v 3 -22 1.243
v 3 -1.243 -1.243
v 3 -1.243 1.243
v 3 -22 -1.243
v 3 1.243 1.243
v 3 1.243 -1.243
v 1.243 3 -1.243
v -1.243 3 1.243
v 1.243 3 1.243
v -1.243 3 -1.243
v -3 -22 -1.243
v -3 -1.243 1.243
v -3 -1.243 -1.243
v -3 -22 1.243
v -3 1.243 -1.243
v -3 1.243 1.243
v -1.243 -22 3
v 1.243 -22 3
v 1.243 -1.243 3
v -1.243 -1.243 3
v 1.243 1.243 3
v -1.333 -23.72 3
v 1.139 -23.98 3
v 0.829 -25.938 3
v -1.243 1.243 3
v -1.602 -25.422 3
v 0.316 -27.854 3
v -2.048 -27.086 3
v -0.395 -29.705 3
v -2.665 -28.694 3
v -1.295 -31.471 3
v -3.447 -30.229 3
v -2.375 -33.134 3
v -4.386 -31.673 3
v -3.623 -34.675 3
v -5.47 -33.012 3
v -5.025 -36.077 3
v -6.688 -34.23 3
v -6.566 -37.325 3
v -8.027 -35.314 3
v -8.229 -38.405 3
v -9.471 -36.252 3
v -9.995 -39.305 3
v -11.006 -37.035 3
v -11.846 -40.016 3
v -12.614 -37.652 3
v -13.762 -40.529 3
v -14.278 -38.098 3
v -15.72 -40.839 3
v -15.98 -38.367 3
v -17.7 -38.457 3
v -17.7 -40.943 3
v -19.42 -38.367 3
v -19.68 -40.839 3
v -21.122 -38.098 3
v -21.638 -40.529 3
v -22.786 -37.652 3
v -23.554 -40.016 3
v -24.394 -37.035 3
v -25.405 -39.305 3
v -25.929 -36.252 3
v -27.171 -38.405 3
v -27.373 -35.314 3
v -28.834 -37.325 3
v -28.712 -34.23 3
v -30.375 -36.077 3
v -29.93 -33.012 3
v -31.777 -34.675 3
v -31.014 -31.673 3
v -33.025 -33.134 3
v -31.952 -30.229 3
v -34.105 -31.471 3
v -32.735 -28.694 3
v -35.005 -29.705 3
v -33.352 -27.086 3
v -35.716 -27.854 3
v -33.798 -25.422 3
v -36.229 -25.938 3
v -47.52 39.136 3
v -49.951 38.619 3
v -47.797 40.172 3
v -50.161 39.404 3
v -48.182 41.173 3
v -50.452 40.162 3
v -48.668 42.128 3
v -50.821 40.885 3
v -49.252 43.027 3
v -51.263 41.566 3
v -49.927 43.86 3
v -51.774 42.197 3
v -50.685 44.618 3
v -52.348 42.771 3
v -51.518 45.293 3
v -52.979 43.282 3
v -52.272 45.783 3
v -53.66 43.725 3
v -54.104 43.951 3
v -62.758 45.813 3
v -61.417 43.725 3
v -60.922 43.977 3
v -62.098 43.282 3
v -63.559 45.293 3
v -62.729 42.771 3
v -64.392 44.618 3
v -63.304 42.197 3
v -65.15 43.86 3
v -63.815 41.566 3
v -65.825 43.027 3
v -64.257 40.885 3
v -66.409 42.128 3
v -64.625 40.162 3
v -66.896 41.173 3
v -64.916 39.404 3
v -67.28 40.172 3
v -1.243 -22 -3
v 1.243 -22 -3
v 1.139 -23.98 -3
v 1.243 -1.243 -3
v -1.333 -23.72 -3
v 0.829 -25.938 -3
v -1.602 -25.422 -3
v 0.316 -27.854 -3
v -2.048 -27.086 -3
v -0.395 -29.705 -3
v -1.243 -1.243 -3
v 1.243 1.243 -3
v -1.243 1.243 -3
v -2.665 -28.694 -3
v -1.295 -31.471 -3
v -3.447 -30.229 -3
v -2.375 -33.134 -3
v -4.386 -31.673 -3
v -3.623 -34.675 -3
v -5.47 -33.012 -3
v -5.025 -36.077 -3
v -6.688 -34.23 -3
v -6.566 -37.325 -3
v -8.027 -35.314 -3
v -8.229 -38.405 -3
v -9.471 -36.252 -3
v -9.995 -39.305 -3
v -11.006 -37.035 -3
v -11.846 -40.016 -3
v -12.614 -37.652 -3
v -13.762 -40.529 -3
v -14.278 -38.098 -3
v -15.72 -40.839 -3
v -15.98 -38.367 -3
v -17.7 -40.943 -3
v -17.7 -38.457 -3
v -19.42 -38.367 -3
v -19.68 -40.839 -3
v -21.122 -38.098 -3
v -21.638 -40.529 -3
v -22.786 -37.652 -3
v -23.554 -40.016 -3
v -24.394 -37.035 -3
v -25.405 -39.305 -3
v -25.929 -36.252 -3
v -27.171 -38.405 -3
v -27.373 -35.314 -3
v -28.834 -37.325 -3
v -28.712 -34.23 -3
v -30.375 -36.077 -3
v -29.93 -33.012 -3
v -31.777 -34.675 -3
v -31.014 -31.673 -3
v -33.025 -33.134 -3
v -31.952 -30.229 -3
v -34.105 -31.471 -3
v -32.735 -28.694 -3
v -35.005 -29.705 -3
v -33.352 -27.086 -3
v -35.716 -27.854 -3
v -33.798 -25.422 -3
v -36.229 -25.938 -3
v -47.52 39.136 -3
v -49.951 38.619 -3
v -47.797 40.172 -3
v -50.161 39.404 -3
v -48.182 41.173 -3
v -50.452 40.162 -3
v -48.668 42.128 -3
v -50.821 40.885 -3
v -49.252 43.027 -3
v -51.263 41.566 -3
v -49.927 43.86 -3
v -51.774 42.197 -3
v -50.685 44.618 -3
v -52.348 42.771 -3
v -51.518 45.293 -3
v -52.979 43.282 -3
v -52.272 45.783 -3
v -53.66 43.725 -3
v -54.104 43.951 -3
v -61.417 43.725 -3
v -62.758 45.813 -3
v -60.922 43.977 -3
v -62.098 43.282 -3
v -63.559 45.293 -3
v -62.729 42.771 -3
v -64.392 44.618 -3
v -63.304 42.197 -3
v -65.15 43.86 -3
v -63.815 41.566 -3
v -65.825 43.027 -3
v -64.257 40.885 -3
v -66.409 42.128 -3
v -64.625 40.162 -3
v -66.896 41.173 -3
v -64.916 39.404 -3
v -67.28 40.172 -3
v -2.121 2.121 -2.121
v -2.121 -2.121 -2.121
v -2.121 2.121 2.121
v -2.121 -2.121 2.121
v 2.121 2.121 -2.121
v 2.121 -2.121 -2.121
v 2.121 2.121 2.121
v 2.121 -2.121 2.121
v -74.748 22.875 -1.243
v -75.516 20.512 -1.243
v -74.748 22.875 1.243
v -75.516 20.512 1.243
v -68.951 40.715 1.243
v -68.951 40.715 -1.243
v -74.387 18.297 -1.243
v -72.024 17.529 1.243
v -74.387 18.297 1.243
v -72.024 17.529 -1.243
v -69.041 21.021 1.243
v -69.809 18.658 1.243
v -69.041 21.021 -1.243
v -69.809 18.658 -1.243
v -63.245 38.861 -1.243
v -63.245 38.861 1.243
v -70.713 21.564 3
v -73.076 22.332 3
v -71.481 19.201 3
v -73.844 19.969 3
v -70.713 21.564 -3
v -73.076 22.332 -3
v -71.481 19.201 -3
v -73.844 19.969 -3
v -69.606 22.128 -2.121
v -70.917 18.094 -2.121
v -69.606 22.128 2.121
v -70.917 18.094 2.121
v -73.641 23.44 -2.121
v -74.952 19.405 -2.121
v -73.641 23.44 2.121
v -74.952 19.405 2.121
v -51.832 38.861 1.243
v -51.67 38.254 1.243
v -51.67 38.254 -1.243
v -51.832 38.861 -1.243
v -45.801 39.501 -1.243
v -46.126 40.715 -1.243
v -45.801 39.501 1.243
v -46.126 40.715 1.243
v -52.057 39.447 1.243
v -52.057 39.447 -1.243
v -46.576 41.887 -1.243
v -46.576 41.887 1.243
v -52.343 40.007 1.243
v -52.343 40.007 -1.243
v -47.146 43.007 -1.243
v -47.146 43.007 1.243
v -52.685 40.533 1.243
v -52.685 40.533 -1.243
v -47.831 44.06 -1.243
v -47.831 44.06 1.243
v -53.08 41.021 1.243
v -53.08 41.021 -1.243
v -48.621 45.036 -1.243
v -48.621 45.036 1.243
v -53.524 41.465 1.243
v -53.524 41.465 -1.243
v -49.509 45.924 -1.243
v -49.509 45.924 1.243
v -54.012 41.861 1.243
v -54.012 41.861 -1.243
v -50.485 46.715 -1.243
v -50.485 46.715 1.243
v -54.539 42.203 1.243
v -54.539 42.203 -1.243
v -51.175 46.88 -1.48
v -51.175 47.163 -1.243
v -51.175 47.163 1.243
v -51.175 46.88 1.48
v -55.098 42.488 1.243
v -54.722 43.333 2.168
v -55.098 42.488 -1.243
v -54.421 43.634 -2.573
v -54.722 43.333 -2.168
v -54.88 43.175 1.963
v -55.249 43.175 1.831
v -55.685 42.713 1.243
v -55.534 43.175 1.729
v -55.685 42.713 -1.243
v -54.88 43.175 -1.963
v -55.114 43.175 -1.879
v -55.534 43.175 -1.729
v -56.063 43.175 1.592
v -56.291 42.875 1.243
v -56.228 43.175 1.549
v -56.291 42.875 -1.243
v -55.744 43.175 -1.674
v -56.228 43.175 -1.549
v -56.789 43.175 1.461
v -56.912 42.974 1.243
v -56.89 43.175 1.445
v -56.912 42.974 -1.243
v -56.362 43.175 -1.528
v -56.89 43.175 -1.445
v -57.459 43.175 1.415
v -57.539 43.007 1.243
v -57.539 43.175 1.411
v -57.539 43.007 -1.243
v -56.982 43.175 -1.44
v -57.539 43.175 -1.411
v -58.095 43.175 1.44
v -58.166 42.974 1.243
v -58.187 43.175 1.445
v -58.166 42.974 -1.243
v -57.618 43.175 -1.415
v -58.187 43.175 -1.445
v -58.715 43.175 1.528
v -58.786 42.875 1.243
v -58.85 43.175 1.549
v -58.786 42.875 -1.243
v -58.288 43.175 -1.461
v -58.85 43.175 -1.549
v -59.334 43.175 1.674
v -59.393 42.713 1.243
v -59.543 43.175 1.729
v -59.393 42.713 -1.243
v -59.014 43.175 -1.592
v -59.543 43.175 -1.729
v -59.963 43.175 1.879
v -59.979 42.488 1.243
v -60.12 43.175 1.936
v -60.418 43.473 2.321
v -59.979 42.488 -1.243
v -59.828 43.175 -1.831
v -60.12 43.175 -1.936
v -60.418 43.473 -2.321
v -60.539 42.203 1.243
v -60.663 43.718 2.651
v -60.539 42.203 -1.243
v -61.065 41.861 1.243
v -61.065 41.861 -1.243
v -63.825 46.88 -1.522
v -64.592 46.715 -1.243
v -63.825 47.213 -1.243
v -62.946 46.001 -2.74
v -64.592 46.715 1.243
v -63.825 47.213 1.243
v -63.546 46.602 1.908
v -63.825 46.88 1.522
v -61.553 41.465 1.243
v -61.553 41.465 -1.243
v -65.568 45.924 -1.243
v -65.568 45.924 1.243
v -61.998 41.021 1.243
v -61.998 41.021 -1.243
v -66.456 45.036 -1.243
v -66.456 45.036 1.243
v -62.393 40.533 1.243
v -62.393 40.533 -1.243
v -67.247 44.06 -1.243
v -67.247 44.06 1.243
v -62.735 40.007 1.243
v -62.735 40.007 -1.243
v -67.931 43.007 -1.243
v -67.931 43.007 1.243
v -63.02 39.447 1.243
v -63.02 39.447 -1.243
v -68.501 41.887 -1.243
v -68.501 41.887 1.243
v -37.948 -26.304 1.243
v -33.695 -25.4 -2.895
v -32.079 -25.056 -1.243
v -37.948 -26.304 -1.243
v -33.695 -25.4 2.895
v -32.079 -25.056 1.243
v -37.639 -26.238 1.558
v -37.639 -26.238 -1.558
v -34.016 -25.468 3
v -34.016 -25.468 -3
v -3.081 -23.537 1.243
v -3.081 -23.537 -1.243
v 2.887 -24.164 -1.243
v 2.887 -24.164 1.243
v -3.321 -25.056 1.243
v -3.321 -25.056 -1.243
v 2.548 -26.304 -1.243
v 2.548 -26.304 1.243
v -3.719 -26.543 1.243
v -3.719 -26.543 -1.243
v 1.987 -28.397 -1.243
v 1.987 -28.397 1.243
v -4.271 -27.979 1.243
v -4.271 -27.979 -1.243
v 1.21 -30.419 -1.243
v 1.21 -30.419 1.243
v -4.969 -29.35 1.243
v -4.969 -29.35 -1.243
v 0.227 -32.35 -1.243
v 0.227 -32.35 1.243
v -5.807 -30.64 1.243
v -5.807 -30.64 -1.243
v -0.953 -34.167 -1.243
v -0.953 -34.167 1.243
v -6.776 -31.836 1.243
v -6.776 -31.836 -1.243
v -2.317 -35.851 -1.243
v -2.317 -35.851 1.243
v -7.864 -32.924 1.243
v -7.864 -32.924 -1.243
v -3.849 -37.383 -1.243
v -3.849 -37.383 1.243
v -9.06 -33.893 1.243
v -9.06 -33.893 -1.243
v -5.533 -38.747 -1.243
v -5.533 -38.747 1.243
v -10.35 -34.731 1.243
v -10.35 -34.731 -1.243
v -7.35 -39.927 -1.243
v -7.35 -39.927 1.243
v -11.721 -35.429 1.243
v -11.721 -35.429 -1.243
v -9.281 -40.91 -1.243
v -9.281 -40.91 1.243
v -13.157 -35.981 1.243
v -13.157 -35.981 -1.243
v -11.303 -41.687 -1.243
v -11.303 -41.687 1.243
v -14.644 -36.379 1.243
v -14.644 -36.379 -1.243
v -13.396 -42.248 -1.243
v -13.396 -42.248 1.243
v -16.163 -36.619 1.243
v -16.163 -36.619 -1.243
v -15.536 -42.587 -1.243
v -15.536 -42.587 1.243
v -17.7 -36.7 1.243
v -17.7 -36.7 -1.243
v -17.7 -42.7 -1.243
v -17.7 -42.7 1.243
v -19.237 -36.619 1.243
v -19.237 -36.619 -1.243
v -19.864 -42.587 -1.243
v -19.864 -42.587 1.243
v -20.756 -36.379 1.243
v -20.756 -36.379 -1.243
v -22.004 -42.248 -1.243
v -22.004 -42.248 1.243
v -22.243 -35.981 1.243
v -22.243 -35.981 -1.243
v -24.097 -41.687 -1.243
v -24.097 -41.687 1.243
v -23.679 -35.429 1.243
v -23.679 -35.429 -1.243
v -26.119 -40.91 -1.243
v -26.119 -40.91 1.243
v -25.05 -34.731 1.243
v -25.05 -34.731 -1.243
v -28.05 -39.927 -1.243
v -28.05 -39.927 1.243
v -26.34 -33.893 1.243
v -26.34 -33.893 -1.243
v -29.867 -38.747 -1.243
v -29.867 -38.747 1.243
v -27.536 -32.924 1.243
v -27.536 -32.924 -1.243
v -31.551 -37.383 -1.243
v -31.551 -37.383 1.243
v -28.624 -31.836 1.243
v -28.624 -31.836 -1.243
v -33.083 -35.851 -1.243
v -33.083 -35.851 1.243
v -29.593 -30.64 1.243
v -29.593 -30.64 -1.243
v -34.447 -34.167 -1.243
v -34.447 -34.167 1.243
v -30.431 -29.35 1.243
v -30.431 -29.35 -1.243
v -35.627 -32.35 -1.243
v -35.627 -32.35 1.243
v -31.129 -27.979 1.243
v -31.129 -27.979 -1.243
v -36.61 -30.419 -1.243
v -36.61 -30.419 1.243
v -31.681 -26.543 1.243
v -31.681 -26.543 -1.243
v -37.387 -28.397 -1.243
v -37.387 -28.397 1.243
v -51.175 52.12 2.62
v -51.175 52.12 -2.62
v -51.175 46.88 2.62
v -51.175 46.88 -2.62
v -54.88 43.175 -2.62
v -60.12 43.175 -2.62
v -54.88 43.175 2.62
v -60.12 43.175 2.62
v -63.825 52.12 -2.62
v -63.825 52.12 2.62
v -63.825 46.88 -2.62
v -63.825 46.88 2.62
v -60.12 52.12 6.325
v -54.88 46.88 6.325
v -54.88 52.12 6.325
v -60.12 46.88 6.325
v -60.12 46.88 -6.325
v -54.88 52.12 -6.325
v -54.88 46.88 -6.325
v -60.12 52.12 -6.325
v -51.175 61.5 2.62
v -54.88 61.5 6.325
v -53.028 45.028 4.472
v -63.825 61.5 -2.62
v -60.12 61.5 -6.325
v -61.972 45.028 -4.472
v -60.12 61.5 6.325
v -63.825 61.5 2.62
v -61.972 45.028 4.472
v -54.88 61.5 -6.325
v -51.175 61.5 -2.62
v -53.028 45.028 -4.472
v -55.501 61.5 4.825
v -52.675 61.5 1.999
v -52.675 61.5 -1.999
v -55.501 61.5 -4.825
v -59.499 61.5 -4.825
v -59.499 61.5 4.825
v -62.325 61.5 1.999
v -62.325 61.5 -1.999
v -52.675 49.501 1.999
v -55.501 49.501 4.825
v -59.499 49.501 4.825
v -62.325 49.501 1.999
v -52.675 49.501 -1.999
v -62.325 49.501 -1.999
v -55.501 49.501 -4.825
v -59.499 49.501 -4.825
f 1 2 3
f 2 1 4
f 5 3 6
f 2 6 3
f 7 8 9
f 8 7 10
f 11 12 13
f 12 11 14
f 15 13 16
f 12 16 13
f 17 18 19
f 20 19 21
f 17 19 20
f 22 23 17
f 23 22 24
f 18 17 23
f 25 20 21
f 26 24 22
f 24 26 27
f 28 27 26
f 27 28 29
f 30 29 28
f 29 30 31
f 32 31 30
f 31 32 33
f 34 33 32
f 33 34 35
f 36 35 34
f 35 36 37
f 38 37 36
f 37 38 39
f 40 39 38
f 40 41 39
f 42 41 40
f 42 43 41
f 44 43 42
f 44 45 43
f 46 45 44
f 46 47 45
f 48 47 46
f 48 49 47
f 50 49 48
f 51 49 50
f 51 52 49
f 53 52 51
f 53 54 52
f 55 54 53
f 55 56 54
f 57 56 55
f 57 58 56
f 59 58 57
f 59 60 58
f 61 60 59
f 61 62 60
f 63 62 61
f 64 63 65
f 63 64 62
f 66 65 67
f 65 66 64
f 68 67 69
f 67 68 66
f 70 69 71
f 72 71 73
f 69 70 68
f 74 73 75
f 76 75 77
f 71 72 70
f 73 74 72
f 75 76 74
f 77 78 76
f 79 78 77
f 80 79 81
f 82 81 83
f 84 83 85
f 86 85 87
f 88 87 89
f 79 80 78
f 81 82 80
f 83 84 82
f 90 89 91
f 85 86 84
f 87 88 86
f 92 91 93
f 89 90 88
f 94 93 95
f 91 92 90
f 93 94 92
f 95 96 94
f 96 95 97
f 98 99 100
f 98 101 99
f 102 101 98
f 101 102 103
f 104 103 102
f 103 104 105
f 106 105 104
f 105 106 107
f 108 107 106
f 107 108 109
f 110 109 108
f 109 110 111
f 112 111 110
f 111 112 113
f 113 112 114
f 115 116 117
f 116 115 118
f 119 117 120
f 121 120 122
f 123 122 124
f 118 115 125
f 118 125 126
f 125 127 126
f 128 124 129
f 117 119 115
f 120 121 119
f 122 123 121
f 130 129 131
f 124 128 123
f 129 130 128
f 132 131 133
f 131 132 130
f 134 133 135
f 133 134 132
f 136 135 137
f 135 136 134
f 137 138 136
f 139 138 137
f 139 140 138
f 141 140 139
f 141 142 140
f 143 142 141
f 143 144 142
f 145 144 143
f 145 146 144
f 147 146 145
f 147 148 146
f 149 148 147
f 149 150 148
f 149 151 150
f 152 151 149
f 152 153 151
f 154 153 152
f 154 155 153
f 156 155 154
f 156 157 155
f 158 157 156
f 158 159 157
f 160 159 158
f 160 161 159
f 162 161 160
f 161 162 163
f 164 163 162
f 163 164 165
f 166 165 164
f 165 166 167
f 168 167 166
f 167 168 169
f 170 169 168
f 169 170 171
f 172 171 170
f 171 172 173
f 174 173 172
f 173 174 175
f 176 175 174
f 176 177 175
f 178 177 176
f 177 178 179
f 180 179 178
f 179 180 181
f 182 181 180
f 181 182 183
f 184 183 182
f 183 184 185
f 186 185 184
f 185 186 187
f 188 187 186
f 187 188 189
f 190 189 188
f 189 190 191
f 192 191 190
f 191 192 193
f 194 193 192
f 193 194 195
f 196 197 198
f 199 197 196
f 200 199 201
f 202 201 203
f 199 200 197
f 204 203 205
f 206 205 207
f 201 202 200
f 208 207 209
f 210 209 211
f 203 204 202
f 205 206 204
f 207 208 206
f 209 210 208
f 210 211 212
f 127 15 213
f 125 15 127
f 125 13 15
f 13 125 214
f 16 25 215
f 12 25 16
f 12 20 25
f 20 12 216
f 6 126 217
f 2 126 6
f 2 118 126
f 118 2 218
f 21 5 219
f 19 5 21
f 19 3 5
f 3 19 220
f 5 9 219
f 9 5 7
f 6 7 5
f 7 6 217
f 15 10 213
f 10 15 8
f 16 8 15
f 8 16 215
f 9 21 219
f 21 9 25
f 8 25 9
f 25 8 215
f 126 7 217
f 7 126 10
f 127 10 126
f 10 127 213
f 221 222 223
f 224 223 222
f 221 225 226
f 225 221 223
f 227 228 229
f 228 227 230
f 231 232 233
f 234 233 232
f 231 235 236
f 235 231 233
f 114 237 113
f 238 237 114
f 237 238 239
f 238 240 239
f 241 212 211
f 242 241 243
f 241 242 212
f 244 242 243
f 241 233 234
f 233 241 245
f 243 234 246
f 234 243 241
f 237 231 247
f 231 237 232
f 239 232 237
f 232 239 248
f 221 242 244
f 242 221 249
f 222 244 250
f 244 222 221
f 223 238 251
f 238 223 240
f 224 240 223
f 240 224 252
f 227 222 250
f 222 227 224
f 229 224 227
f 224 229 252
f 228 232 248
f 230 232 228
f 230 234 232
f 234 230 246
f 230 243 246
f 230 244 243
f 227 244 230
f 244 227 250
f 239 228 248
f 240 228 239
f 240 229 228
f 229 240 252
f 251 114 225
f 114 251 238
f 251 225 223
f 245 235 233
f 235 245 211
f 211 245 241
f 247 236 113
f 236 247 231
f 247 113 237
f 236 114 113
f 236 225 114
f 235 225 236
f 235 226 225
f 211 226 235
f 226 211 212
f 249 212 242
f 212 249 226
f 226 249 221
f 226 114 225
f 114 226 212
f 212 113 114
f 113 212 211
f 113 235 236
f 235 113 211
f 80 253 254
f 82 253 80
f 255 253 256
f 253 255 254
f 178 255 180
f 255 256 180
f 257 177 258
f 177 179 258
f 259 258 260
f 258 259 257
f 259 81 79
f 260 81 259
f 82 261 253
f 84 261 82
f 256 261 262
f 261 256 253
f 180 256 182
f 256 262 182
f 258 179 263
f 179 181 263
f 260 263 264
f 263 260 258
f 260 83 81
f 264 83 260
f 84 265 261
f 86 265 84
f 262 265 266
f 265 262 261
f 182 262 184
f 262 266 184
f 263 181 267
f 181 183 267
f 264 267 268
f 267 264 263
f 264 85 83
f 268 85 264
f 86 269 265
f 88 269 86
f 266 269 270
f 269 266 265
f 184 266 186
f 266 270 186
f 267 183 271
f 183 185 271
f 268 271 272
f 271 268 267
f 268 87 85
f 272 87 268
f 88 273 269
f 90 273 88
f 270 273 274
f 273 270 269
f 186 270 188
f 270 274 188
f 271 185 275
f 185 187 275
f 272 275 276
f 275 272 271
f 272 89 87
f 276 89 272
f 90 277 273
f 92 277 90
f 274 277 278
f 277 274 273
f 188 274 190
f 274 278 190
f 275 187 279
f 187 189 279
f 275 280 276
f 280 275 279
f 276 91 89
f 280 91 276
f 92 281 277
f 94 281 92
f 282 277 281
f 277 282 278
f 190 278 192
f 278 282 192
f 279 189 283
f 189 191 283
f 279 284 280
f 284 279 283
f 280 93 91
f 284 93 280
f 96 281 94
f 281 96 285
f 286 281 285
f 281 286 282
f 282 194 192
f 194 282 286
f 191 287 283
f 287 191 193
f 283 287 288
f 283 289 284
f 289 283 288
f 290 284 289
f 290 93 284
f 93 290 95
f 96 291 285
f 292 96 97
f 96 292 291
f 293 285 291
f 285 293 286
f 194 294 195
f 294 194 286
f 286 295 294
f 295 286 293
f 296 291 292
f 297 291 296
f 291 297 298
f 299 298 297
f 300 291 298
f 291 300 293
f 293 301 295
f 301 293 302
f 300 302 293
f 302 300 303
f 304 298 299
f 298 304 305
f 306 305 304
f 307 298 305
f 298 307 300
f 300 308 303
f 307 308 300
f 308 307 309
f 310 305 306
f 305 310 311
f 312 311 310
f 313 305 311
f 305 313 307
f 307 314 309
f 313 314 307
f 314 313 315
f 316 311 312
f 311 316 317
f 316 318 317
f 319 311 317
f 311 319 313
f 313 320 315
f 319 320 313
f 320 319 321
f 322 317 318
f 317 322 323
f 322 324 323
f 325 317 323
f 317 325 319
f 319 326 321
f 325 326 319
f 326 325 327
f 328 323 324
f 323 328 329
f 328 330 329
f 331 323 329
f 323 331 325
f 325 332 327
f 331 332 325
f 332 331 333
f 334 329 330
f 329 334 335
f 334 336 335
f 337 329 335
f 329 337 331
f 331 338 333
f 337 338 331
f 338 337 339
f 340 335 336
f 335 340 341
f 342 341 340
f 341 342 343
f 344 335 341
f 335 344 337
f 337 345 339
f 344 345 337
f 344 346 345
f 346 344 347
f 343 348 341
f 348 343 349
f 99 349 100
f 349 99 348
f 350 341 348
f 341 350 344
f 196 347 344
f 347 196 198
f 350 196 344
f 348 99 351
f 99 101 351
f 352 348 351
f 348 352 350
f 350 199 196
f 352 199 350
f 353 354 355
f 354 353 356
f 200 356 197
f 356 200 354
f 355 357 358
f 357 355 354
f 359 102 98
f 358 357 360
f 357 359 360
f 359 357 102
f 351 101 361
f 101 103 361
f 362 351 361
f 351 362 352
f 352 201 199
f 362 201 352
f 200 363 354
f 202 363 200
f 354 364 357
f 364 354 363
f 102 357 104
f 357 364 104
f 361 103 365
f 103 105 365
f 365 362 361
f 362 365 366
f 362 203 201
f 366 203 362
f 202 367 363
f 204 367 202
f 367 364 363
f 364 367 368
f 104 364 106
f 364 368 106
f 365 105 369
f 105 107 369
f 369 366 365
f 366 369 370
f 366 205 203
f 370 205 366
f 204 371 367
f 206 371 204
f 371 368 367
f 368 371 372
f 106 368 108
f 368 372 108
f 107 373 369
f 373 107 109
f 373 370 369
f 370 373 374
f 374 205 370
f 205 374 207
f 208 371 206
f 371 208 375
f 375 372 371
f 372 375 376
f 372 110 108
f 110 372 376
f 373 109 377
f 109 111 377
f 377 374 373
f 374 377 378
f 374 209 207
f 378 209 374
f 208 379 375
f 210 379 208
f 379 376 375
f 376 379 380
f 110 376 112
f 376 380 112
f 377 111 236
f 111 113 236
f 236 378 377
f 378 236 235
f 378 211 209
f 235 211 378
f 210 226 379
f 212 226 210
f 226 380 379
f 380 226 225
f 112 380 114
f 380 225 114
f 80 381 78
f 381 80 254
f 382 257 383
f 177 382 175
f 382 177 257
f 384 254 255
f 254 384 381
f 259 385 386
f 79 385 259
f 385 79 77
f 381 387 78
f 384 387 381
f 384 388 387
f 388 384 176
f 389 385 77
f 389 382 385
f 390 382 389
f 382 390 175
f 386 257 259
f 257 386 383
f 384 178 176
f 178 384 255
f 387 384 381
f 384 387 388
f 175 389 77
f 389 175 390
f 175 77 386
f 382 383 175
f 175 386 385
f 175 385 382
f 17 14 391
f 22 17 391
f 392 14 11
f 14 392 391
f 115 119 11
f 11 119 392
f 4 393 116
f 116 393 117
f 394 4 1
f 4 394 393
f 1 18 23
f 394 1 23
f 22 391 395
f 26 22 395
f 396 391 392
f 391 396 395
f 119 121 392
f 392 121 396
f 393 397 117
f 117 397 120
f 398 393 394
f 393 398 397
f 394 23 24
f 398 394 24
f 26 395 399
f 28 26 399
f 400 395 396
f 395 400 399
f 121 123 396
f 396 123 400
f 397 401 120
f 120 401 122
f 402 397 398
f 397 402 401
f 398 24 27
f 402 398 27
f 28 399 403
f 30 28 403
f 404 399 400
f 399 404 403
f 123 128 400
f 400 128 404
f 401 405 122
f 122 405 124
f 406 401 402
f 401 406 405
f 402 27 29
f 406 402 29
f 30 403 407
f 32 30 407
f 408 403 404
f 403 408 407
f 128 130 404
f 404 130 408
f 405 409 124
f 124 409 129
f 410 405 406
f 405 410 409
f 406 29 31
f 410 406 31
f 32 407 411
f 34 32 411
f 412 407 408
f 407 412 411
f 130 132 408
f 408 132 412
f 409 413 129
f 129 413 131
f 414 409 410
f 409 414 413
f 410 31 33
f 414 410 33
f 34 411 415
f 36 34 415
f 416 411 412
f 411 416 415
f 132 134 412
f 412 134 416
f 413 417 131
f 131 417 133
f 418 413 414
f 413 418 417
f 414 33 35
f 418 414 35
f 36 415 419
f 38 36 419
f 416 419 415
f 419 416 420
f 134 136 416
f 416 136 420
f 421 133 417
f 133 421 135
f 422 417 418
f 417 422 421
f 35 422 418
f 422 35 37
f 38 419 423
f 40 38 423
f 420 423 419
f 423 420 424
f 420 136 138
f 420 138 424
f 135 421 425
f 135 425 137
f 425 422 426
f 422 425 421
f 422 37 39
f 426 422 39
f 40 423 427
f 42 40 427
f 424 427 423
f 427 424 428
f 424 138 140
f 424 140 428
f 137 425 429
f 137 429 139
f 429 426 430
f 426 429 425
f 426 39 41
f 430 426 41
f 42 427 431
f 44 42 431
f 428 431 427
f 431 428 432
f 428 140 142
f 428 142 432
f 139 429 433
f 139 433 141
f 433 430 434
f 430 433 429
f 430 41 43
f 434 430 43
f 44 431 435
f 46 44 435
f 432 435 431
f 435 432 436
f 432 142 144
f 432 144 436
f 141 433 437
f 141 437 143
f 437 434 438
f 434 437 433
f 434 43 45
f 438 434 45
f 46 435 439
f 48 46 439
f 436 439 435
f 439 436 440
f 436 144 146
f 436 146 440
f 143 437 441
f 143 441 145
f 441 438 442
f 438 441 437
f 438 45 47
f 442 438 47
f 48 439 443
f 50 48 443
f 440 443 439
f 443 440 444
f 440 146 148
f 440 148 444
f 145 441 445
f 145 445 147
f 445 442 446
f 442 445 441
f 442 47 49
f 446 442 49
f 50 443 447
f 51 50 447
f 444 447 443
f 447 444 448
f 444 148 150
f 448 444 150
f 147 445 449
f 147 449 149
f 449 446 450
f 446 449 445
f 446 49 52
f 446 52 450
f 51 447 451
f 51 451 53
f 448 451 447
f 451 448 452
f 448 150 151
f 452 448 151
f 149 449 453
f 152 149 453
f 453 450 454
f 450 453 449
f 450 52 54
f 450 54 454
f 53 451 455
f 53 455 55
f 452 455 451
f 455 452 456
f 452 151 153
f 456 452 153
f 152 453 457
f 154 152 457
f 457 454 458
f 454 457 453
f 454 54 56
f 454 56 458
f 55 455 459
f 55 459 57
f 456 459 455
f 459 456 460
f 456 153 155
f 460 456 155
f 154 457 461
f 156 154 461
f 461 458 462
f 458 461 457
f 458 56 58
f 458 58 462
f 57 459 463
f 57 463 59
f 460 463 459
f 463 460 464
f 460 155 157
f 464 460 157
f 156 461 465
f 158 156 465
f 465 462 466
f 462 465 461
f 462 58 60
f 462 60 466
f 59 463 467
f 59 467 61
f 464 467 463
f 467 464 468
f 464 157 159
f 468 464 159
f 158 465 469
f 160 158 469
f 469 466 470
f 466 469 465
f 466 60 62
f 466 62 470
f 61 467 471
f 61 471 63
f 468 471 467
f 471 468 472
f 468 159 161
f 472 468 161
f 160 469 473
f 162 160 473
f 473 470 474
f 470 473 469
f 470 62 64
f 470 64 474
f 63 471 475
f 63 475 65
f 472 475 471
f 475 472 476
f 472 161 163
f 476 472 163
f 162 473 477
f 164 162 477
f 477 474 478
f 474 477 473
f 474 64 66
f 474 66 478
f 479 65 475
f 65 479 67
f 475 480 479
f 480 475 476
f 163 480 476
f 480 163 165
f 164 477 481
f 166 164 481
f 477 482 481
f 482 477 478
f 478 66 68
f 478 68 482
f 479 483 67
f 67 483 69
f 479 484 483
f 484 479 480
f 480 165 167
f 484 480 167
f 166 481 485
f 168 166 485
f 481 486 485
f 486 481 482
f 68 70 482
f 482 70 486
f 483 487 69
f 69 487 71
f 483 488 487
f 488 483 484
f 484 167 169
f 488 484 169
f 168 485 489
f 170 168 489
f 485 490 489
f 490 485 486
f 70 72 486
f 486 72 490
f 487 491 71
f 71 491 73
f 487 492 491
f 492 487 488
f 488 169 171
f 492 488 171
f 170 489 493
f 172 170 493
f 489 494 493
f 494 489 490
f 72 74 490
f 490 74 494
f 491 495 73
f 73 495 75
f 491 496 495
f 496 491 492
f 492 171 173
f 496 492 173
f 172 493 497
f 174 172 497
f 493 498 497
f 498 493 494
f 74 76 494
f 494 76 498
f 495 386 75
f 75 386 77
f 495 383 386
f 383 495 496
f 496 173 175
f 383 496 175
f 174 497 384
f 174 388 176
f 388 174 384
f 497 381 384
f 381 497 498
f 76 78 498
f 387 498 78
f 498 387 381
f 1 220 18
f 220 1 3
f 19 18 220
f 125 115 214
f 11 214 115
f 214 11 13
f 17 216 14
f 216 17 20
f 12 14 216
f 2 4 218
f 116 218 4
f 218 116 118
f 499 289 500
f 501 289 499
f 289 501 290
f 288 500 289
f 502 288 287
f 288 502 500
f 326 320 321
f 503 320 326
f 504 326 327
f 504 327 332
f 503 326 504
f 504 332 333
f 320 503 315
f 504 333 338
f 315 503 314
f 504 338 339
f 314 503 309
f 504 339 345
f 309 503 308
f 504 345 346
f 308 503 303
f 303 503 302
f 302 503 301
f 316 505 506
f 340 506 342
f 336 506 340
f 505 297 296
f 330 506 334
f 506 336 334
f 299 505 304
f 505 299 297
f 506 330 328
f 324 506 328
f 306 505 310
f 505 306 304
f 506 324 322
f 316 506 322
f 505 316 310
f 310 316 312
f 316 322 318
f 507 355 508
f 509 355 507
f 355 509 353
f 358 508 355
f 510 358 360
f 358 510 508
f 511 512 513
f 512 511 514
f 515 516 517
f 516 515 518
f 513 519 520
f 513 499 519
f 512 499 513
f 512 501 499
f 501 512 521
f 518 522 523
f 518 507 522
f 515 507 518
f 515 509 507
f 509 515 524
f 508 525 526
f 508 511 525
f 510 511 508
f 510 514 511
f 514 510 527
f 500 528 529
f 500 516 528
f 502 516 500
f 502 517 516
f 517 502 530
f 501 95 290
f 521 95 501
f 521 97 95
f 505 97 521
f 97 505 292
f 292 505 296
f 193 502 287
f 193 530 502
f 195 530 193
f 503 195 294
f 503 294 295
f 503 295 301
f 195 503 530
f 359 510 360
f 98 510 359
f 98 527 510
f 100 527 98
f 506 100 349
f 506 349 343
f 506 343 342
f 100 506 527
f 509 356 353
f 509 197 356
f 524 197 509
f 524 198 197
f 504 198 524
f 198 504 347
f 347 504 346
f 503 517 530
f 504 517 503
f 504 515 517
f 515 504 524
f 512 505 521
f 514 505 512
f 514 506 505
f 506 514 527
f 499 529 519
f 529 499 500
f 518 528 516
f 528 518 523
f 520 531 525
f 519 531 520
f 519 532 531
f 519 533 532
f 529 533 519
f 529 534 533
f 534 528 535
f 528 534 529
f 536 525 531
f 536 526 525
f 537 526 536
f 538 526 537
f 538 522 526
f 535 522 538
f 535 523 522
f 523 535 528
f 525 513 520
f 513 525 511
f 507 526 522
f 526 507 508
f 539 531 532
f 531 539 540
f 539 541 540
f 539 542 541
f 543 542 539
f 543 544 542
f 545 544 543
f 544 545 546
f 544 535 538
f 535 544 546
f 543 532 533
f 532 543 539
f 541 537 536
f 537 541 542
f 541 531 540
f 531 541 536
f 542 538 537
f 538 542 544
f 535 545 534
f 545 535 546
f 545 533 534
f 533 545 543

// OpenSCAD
eps = 0.001;
r = 3;

module octagon(radius) {
  intersection_for(a = [0, 45])
    rotate([0, 0, a])
      square(2*radius, center=true);
}

module profile() {
  octagon(r);
}

module straight(l) {
  linear_extrude(l)
    profile();
  translate([0, 0, l])
    children();
}

module curve(r, a) {
  translate([-r, 0, 0])
    rotate([90, 0, 0])
      rotate_extrude(angle=a, $fn=60)
        translate([r, 0, 0])
          profile();
  translate([-r, 0, 0])
    rotate([0, -a, 0])
      translate([r, 0, 0])
        children();
}

module ball() {
  intersection_for(as = [
    [0, 0, 0],
    [0, 0, 45],
    [0, 45, 0],
    [45, 0, 0],
  ])
    rotate(as)
      cube(2*r, center=true);
  
  children();
}

module hook() {
  ball()
  straight(22)
  curve(25.4/2+r + 2, 168)
  straight(66)
  mirror([1, 0, 0])
  curve(9, 150)
  straight(20)
  ball();
}

ferrule_id = 9.65;
ferrule_wall = 3;
ferrule_length = 12;

module ferrule_exterior() {
  linear_extrude(ferrule_length)
    octagon((ferrule_id + ferrule_wall)/2);
  
  translate([0, 0, ferrule_length])
    intersection_for(as = [
      [0, 0, 0],
      [0, 0, 45],
      [0, 45, 0],
      [45, 0, 0],
    ])
      rotate(as)
        cube(ferrule_id + ferrule_wall, center=true);
}

module ferrule_interior() {
  translate([0, 0, -eps])
    linear_extrude(ferrule_length)
      octagon(ferrule_id/2);
}

module hook_plus_ferrule() {
  ferrule_offs = [-57.5, 0, -61.5];
  difference() {
    union() {
      hook();  
      translate(ferrule_offs)
        ferrule_exterior();
    }
    translate(ferrule_offs)
      ferrule_interior();
  }
}

module main() {
  rotate([90, 0, 0])
    hook_plus_ferrule();
}

main();
